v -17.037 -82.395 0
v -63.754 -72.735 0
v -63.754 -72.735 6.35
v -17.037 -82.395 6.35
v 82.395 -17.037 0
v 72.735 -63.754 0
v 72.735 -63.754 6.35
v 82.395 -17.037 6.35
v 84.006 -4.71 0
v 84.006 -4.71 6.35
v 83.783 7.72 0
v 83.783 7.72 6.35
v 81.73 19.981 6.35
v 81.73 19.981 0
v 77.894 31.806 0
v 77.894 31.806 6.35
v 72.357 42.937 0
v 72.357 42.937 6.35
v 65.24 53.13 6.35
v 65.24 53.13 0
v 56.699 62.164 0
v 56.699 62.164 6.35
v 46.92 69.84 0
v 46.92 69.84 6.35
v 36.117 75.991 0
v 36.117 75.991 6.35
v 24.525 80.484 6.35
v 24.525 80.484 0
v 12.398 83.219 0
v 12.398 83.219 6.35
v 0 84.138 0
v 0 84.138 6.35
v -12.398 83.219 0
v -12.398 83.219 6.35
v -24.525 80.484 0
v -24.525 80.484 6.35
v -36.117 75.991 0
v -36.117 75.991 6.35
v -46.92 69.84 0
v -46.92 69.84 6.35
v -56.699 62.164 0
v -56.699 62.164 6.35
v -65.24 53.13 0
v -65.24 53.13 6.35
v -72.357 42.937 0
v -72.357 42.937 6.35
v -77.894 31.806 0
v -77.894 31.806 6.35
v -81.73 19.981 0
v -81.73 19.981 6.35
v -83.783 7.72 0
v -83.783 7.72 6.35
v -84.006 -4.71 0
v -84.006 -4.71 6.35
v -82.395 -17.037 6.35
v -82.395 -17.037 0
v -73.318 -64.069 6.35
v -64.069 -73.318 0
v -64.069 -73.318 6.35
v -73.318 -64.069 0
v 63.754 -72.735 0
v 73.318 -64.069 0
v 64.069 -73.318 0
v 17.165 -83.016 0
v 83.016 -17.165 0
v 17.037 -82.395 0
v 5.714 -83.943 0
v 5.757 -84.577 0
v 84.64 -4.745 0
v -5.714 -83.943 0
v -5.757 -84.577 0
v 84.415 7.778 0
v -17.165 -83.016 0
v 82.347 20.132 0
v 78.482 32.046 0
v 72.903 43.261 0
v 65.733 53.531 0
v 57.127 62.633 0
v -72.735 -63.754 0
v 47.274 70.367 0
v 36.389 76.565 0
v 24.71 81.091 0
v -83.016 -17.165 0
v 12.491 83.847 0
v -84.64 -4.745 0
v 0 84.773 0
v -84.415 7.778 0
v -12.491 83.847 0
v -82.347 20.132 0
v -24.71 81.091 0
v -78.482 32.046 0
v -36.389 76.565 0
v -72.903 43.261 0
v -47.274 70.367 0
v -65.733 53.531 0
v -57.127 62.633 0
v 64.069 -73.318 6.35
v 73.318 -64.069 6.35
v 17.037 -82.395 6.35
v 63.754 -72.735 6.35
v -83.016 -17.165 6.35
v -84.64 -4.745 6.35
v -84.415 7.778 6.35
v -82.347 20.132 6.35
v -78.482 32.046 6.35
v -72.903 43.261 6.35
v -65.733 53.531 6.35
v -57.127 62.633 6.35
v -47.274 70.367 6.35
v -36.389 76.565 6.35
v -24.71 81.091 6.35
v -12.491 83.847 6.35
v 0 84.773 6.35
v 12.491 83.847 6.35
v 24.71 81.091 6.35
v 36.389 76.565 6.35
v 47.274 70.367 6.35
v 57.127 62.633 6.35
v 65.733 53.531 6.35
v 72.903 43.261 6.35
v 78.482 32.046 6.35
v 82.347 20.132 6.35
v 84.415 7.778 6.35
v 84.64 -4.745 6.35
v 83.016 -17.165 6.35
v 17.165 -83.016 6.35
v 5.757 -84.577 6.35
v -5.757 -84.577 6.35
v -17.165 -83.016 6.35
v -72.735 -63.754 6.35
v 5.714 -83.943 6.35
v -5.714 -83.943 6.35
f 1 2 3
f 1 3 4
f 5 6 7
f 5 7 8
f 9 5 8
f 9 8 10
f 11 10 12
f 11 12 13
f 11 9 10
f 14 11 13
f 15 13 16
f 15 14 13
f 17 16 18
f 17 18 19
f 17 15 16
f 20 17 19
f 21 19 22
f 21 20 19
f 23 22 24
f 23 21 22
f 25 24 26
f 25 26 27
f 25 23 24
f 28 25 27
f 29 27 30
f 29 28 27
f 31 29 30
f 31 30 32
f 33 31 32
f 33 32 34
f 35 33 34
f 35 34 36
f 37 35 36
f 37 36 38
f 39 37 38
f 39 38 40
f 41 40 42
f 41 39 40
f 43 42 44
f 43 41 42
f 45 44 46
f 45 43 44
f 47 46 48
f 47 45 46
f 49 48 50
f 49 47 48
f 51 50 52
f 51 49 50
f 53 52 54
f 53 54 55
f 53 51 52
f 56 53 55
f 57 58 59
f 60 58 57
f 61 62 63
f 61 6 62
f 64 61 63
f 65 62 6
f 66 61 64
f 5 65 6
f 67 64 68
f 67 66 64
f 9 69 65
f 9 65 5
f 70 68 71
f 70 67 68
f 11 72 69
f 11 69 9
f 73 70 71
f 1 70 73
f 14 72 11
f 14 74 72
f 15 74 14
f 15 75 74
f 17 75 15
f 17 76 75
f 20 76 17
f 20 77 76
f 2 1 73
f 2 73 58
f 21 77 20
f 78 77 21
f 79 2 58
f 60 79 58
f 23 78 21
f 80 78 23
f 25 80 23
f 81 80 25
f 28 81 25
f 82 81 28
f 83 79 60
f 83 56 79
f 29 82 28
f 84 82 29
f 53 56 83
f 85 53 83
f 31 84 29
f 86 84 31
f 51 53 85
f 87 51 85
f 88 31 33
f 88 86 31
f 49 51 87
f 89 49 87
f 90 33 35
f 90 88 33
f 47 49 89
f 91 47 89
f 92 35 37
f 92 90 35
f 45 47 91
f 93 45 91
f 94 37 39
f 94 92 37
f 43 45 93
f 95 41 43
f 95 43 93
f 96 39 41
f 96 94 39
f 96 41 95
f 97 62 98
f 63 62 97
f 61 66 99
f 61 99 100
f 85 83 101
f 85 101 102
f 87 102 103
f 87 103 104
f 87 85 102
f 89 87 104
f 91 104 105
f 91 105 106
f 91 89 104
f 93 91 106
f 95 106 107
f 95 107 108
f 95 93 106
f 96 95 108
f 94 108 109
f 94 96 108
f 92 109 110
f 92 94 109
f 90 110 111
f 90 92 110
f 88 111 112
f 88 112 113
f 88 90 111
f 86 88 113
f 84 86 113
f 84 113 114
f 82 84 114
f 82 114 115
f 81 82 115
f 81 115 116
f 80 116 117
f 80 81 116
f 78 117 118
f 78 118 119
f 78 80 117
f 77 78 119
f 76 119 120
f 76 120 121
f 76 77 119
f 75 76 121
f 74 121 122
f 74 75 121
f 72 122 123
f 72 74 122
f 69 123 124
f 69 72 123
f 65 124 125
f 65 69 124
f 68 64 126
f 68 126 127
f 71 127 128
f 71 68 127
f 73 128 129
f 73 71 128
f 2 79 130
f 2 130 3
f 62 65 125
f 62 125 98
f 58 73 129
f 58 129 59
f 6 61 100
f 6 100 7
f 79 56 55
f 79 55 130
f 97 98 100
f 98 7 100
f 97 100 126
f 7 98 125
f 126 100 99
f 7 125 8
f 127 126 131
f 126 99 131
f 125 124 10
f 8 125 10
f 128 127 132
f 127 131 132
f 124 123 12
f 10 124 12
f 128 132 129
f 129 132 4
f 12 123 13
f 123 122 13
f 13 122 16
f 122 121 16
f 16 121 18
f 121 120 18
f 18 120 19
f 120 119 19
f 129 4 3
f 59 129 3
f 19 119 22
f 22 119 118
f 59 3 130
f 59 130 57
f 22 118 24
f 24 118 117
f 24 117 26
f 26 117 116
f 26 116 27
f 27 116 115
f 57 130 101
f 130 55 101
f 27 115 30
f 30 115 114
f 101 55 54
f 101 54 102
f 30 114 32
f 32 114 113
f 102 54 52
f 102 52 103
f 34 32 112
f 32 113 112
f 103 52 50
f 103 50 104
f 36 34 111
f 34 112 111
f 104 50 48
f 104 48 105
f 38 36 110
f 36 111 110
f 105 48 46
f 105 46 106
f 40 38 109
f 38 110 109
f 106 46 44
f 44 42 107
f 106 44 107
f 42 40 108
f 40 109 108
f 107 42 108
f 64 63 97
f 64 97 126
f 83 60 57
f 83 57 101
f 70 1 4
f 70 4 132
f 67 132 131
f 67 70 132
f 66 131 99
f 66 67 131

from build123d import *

# Parameters (mm, degrees)
BOSS_EXTRUDE1_DEPTH = 6.35


with BuildPart() as part:
    # Sketch1 → Boss-Extrude1 (new body)
    with BuildSketch(Plane.XY):
        with BuildLine():
            Line((-73.318041641, -64.069069833), (-83.016400713, -17.165487727))
            ThreePointArc((-83.016400713, -17.165487727), (0, 84.7725), (83.016400713, -17.165487727))
            Line((83.016400713, -17.165487727), (73.318041641, -64.069069833))
            Line((73.318041641, -64.069069833), (64.069069833, -73.318041641))
            Line((64.069069833, -73.318041641), (17.165487727, -83.016400713))
            ThreePointArc((17.165487727, -83.016400713), (0, -84.7725), (-17.165487727, -83.016400713))
            Line((-17.165487727, -83.016400713), (-64.069069833, -73.318041641))
            Line((-64.069069833, -73.318041641), (-73.318041641, -64.069069833))
        make_face()
        with BuildLine():
            Line((63.75441487, -72.734670991), (72.734670991, -63.75441487))
            Line((72.734670991, -63.75441487), (82.394555015, -17.036907295))
            ThreePointArc((82.394555015, -17.036907295), (0, 84.1375), (-82.394555015, -17.036907295))
            Line((-82.394555015, -17.036907295), (-72.734670991, -63.75441487))
            Line((-72.734670991, -63.75441487), (-63.75441487, -72.734670991))
            Line((-63.75441487, -72.734670991), (-17.036907295, -82.394555015))
            ThreePointArc((-17.036907295, -82.394555015), (0, -84.1375), (17.036907295, -82.394555015))
            Line((17.036907295, -82.394555015), (63.75441487, -72.734670991))
        make_face(mode=Mode.SUBTRACT)
    extrude(amount=BOSS_EXTRUDE1_DEPTH)


solid = part.part
